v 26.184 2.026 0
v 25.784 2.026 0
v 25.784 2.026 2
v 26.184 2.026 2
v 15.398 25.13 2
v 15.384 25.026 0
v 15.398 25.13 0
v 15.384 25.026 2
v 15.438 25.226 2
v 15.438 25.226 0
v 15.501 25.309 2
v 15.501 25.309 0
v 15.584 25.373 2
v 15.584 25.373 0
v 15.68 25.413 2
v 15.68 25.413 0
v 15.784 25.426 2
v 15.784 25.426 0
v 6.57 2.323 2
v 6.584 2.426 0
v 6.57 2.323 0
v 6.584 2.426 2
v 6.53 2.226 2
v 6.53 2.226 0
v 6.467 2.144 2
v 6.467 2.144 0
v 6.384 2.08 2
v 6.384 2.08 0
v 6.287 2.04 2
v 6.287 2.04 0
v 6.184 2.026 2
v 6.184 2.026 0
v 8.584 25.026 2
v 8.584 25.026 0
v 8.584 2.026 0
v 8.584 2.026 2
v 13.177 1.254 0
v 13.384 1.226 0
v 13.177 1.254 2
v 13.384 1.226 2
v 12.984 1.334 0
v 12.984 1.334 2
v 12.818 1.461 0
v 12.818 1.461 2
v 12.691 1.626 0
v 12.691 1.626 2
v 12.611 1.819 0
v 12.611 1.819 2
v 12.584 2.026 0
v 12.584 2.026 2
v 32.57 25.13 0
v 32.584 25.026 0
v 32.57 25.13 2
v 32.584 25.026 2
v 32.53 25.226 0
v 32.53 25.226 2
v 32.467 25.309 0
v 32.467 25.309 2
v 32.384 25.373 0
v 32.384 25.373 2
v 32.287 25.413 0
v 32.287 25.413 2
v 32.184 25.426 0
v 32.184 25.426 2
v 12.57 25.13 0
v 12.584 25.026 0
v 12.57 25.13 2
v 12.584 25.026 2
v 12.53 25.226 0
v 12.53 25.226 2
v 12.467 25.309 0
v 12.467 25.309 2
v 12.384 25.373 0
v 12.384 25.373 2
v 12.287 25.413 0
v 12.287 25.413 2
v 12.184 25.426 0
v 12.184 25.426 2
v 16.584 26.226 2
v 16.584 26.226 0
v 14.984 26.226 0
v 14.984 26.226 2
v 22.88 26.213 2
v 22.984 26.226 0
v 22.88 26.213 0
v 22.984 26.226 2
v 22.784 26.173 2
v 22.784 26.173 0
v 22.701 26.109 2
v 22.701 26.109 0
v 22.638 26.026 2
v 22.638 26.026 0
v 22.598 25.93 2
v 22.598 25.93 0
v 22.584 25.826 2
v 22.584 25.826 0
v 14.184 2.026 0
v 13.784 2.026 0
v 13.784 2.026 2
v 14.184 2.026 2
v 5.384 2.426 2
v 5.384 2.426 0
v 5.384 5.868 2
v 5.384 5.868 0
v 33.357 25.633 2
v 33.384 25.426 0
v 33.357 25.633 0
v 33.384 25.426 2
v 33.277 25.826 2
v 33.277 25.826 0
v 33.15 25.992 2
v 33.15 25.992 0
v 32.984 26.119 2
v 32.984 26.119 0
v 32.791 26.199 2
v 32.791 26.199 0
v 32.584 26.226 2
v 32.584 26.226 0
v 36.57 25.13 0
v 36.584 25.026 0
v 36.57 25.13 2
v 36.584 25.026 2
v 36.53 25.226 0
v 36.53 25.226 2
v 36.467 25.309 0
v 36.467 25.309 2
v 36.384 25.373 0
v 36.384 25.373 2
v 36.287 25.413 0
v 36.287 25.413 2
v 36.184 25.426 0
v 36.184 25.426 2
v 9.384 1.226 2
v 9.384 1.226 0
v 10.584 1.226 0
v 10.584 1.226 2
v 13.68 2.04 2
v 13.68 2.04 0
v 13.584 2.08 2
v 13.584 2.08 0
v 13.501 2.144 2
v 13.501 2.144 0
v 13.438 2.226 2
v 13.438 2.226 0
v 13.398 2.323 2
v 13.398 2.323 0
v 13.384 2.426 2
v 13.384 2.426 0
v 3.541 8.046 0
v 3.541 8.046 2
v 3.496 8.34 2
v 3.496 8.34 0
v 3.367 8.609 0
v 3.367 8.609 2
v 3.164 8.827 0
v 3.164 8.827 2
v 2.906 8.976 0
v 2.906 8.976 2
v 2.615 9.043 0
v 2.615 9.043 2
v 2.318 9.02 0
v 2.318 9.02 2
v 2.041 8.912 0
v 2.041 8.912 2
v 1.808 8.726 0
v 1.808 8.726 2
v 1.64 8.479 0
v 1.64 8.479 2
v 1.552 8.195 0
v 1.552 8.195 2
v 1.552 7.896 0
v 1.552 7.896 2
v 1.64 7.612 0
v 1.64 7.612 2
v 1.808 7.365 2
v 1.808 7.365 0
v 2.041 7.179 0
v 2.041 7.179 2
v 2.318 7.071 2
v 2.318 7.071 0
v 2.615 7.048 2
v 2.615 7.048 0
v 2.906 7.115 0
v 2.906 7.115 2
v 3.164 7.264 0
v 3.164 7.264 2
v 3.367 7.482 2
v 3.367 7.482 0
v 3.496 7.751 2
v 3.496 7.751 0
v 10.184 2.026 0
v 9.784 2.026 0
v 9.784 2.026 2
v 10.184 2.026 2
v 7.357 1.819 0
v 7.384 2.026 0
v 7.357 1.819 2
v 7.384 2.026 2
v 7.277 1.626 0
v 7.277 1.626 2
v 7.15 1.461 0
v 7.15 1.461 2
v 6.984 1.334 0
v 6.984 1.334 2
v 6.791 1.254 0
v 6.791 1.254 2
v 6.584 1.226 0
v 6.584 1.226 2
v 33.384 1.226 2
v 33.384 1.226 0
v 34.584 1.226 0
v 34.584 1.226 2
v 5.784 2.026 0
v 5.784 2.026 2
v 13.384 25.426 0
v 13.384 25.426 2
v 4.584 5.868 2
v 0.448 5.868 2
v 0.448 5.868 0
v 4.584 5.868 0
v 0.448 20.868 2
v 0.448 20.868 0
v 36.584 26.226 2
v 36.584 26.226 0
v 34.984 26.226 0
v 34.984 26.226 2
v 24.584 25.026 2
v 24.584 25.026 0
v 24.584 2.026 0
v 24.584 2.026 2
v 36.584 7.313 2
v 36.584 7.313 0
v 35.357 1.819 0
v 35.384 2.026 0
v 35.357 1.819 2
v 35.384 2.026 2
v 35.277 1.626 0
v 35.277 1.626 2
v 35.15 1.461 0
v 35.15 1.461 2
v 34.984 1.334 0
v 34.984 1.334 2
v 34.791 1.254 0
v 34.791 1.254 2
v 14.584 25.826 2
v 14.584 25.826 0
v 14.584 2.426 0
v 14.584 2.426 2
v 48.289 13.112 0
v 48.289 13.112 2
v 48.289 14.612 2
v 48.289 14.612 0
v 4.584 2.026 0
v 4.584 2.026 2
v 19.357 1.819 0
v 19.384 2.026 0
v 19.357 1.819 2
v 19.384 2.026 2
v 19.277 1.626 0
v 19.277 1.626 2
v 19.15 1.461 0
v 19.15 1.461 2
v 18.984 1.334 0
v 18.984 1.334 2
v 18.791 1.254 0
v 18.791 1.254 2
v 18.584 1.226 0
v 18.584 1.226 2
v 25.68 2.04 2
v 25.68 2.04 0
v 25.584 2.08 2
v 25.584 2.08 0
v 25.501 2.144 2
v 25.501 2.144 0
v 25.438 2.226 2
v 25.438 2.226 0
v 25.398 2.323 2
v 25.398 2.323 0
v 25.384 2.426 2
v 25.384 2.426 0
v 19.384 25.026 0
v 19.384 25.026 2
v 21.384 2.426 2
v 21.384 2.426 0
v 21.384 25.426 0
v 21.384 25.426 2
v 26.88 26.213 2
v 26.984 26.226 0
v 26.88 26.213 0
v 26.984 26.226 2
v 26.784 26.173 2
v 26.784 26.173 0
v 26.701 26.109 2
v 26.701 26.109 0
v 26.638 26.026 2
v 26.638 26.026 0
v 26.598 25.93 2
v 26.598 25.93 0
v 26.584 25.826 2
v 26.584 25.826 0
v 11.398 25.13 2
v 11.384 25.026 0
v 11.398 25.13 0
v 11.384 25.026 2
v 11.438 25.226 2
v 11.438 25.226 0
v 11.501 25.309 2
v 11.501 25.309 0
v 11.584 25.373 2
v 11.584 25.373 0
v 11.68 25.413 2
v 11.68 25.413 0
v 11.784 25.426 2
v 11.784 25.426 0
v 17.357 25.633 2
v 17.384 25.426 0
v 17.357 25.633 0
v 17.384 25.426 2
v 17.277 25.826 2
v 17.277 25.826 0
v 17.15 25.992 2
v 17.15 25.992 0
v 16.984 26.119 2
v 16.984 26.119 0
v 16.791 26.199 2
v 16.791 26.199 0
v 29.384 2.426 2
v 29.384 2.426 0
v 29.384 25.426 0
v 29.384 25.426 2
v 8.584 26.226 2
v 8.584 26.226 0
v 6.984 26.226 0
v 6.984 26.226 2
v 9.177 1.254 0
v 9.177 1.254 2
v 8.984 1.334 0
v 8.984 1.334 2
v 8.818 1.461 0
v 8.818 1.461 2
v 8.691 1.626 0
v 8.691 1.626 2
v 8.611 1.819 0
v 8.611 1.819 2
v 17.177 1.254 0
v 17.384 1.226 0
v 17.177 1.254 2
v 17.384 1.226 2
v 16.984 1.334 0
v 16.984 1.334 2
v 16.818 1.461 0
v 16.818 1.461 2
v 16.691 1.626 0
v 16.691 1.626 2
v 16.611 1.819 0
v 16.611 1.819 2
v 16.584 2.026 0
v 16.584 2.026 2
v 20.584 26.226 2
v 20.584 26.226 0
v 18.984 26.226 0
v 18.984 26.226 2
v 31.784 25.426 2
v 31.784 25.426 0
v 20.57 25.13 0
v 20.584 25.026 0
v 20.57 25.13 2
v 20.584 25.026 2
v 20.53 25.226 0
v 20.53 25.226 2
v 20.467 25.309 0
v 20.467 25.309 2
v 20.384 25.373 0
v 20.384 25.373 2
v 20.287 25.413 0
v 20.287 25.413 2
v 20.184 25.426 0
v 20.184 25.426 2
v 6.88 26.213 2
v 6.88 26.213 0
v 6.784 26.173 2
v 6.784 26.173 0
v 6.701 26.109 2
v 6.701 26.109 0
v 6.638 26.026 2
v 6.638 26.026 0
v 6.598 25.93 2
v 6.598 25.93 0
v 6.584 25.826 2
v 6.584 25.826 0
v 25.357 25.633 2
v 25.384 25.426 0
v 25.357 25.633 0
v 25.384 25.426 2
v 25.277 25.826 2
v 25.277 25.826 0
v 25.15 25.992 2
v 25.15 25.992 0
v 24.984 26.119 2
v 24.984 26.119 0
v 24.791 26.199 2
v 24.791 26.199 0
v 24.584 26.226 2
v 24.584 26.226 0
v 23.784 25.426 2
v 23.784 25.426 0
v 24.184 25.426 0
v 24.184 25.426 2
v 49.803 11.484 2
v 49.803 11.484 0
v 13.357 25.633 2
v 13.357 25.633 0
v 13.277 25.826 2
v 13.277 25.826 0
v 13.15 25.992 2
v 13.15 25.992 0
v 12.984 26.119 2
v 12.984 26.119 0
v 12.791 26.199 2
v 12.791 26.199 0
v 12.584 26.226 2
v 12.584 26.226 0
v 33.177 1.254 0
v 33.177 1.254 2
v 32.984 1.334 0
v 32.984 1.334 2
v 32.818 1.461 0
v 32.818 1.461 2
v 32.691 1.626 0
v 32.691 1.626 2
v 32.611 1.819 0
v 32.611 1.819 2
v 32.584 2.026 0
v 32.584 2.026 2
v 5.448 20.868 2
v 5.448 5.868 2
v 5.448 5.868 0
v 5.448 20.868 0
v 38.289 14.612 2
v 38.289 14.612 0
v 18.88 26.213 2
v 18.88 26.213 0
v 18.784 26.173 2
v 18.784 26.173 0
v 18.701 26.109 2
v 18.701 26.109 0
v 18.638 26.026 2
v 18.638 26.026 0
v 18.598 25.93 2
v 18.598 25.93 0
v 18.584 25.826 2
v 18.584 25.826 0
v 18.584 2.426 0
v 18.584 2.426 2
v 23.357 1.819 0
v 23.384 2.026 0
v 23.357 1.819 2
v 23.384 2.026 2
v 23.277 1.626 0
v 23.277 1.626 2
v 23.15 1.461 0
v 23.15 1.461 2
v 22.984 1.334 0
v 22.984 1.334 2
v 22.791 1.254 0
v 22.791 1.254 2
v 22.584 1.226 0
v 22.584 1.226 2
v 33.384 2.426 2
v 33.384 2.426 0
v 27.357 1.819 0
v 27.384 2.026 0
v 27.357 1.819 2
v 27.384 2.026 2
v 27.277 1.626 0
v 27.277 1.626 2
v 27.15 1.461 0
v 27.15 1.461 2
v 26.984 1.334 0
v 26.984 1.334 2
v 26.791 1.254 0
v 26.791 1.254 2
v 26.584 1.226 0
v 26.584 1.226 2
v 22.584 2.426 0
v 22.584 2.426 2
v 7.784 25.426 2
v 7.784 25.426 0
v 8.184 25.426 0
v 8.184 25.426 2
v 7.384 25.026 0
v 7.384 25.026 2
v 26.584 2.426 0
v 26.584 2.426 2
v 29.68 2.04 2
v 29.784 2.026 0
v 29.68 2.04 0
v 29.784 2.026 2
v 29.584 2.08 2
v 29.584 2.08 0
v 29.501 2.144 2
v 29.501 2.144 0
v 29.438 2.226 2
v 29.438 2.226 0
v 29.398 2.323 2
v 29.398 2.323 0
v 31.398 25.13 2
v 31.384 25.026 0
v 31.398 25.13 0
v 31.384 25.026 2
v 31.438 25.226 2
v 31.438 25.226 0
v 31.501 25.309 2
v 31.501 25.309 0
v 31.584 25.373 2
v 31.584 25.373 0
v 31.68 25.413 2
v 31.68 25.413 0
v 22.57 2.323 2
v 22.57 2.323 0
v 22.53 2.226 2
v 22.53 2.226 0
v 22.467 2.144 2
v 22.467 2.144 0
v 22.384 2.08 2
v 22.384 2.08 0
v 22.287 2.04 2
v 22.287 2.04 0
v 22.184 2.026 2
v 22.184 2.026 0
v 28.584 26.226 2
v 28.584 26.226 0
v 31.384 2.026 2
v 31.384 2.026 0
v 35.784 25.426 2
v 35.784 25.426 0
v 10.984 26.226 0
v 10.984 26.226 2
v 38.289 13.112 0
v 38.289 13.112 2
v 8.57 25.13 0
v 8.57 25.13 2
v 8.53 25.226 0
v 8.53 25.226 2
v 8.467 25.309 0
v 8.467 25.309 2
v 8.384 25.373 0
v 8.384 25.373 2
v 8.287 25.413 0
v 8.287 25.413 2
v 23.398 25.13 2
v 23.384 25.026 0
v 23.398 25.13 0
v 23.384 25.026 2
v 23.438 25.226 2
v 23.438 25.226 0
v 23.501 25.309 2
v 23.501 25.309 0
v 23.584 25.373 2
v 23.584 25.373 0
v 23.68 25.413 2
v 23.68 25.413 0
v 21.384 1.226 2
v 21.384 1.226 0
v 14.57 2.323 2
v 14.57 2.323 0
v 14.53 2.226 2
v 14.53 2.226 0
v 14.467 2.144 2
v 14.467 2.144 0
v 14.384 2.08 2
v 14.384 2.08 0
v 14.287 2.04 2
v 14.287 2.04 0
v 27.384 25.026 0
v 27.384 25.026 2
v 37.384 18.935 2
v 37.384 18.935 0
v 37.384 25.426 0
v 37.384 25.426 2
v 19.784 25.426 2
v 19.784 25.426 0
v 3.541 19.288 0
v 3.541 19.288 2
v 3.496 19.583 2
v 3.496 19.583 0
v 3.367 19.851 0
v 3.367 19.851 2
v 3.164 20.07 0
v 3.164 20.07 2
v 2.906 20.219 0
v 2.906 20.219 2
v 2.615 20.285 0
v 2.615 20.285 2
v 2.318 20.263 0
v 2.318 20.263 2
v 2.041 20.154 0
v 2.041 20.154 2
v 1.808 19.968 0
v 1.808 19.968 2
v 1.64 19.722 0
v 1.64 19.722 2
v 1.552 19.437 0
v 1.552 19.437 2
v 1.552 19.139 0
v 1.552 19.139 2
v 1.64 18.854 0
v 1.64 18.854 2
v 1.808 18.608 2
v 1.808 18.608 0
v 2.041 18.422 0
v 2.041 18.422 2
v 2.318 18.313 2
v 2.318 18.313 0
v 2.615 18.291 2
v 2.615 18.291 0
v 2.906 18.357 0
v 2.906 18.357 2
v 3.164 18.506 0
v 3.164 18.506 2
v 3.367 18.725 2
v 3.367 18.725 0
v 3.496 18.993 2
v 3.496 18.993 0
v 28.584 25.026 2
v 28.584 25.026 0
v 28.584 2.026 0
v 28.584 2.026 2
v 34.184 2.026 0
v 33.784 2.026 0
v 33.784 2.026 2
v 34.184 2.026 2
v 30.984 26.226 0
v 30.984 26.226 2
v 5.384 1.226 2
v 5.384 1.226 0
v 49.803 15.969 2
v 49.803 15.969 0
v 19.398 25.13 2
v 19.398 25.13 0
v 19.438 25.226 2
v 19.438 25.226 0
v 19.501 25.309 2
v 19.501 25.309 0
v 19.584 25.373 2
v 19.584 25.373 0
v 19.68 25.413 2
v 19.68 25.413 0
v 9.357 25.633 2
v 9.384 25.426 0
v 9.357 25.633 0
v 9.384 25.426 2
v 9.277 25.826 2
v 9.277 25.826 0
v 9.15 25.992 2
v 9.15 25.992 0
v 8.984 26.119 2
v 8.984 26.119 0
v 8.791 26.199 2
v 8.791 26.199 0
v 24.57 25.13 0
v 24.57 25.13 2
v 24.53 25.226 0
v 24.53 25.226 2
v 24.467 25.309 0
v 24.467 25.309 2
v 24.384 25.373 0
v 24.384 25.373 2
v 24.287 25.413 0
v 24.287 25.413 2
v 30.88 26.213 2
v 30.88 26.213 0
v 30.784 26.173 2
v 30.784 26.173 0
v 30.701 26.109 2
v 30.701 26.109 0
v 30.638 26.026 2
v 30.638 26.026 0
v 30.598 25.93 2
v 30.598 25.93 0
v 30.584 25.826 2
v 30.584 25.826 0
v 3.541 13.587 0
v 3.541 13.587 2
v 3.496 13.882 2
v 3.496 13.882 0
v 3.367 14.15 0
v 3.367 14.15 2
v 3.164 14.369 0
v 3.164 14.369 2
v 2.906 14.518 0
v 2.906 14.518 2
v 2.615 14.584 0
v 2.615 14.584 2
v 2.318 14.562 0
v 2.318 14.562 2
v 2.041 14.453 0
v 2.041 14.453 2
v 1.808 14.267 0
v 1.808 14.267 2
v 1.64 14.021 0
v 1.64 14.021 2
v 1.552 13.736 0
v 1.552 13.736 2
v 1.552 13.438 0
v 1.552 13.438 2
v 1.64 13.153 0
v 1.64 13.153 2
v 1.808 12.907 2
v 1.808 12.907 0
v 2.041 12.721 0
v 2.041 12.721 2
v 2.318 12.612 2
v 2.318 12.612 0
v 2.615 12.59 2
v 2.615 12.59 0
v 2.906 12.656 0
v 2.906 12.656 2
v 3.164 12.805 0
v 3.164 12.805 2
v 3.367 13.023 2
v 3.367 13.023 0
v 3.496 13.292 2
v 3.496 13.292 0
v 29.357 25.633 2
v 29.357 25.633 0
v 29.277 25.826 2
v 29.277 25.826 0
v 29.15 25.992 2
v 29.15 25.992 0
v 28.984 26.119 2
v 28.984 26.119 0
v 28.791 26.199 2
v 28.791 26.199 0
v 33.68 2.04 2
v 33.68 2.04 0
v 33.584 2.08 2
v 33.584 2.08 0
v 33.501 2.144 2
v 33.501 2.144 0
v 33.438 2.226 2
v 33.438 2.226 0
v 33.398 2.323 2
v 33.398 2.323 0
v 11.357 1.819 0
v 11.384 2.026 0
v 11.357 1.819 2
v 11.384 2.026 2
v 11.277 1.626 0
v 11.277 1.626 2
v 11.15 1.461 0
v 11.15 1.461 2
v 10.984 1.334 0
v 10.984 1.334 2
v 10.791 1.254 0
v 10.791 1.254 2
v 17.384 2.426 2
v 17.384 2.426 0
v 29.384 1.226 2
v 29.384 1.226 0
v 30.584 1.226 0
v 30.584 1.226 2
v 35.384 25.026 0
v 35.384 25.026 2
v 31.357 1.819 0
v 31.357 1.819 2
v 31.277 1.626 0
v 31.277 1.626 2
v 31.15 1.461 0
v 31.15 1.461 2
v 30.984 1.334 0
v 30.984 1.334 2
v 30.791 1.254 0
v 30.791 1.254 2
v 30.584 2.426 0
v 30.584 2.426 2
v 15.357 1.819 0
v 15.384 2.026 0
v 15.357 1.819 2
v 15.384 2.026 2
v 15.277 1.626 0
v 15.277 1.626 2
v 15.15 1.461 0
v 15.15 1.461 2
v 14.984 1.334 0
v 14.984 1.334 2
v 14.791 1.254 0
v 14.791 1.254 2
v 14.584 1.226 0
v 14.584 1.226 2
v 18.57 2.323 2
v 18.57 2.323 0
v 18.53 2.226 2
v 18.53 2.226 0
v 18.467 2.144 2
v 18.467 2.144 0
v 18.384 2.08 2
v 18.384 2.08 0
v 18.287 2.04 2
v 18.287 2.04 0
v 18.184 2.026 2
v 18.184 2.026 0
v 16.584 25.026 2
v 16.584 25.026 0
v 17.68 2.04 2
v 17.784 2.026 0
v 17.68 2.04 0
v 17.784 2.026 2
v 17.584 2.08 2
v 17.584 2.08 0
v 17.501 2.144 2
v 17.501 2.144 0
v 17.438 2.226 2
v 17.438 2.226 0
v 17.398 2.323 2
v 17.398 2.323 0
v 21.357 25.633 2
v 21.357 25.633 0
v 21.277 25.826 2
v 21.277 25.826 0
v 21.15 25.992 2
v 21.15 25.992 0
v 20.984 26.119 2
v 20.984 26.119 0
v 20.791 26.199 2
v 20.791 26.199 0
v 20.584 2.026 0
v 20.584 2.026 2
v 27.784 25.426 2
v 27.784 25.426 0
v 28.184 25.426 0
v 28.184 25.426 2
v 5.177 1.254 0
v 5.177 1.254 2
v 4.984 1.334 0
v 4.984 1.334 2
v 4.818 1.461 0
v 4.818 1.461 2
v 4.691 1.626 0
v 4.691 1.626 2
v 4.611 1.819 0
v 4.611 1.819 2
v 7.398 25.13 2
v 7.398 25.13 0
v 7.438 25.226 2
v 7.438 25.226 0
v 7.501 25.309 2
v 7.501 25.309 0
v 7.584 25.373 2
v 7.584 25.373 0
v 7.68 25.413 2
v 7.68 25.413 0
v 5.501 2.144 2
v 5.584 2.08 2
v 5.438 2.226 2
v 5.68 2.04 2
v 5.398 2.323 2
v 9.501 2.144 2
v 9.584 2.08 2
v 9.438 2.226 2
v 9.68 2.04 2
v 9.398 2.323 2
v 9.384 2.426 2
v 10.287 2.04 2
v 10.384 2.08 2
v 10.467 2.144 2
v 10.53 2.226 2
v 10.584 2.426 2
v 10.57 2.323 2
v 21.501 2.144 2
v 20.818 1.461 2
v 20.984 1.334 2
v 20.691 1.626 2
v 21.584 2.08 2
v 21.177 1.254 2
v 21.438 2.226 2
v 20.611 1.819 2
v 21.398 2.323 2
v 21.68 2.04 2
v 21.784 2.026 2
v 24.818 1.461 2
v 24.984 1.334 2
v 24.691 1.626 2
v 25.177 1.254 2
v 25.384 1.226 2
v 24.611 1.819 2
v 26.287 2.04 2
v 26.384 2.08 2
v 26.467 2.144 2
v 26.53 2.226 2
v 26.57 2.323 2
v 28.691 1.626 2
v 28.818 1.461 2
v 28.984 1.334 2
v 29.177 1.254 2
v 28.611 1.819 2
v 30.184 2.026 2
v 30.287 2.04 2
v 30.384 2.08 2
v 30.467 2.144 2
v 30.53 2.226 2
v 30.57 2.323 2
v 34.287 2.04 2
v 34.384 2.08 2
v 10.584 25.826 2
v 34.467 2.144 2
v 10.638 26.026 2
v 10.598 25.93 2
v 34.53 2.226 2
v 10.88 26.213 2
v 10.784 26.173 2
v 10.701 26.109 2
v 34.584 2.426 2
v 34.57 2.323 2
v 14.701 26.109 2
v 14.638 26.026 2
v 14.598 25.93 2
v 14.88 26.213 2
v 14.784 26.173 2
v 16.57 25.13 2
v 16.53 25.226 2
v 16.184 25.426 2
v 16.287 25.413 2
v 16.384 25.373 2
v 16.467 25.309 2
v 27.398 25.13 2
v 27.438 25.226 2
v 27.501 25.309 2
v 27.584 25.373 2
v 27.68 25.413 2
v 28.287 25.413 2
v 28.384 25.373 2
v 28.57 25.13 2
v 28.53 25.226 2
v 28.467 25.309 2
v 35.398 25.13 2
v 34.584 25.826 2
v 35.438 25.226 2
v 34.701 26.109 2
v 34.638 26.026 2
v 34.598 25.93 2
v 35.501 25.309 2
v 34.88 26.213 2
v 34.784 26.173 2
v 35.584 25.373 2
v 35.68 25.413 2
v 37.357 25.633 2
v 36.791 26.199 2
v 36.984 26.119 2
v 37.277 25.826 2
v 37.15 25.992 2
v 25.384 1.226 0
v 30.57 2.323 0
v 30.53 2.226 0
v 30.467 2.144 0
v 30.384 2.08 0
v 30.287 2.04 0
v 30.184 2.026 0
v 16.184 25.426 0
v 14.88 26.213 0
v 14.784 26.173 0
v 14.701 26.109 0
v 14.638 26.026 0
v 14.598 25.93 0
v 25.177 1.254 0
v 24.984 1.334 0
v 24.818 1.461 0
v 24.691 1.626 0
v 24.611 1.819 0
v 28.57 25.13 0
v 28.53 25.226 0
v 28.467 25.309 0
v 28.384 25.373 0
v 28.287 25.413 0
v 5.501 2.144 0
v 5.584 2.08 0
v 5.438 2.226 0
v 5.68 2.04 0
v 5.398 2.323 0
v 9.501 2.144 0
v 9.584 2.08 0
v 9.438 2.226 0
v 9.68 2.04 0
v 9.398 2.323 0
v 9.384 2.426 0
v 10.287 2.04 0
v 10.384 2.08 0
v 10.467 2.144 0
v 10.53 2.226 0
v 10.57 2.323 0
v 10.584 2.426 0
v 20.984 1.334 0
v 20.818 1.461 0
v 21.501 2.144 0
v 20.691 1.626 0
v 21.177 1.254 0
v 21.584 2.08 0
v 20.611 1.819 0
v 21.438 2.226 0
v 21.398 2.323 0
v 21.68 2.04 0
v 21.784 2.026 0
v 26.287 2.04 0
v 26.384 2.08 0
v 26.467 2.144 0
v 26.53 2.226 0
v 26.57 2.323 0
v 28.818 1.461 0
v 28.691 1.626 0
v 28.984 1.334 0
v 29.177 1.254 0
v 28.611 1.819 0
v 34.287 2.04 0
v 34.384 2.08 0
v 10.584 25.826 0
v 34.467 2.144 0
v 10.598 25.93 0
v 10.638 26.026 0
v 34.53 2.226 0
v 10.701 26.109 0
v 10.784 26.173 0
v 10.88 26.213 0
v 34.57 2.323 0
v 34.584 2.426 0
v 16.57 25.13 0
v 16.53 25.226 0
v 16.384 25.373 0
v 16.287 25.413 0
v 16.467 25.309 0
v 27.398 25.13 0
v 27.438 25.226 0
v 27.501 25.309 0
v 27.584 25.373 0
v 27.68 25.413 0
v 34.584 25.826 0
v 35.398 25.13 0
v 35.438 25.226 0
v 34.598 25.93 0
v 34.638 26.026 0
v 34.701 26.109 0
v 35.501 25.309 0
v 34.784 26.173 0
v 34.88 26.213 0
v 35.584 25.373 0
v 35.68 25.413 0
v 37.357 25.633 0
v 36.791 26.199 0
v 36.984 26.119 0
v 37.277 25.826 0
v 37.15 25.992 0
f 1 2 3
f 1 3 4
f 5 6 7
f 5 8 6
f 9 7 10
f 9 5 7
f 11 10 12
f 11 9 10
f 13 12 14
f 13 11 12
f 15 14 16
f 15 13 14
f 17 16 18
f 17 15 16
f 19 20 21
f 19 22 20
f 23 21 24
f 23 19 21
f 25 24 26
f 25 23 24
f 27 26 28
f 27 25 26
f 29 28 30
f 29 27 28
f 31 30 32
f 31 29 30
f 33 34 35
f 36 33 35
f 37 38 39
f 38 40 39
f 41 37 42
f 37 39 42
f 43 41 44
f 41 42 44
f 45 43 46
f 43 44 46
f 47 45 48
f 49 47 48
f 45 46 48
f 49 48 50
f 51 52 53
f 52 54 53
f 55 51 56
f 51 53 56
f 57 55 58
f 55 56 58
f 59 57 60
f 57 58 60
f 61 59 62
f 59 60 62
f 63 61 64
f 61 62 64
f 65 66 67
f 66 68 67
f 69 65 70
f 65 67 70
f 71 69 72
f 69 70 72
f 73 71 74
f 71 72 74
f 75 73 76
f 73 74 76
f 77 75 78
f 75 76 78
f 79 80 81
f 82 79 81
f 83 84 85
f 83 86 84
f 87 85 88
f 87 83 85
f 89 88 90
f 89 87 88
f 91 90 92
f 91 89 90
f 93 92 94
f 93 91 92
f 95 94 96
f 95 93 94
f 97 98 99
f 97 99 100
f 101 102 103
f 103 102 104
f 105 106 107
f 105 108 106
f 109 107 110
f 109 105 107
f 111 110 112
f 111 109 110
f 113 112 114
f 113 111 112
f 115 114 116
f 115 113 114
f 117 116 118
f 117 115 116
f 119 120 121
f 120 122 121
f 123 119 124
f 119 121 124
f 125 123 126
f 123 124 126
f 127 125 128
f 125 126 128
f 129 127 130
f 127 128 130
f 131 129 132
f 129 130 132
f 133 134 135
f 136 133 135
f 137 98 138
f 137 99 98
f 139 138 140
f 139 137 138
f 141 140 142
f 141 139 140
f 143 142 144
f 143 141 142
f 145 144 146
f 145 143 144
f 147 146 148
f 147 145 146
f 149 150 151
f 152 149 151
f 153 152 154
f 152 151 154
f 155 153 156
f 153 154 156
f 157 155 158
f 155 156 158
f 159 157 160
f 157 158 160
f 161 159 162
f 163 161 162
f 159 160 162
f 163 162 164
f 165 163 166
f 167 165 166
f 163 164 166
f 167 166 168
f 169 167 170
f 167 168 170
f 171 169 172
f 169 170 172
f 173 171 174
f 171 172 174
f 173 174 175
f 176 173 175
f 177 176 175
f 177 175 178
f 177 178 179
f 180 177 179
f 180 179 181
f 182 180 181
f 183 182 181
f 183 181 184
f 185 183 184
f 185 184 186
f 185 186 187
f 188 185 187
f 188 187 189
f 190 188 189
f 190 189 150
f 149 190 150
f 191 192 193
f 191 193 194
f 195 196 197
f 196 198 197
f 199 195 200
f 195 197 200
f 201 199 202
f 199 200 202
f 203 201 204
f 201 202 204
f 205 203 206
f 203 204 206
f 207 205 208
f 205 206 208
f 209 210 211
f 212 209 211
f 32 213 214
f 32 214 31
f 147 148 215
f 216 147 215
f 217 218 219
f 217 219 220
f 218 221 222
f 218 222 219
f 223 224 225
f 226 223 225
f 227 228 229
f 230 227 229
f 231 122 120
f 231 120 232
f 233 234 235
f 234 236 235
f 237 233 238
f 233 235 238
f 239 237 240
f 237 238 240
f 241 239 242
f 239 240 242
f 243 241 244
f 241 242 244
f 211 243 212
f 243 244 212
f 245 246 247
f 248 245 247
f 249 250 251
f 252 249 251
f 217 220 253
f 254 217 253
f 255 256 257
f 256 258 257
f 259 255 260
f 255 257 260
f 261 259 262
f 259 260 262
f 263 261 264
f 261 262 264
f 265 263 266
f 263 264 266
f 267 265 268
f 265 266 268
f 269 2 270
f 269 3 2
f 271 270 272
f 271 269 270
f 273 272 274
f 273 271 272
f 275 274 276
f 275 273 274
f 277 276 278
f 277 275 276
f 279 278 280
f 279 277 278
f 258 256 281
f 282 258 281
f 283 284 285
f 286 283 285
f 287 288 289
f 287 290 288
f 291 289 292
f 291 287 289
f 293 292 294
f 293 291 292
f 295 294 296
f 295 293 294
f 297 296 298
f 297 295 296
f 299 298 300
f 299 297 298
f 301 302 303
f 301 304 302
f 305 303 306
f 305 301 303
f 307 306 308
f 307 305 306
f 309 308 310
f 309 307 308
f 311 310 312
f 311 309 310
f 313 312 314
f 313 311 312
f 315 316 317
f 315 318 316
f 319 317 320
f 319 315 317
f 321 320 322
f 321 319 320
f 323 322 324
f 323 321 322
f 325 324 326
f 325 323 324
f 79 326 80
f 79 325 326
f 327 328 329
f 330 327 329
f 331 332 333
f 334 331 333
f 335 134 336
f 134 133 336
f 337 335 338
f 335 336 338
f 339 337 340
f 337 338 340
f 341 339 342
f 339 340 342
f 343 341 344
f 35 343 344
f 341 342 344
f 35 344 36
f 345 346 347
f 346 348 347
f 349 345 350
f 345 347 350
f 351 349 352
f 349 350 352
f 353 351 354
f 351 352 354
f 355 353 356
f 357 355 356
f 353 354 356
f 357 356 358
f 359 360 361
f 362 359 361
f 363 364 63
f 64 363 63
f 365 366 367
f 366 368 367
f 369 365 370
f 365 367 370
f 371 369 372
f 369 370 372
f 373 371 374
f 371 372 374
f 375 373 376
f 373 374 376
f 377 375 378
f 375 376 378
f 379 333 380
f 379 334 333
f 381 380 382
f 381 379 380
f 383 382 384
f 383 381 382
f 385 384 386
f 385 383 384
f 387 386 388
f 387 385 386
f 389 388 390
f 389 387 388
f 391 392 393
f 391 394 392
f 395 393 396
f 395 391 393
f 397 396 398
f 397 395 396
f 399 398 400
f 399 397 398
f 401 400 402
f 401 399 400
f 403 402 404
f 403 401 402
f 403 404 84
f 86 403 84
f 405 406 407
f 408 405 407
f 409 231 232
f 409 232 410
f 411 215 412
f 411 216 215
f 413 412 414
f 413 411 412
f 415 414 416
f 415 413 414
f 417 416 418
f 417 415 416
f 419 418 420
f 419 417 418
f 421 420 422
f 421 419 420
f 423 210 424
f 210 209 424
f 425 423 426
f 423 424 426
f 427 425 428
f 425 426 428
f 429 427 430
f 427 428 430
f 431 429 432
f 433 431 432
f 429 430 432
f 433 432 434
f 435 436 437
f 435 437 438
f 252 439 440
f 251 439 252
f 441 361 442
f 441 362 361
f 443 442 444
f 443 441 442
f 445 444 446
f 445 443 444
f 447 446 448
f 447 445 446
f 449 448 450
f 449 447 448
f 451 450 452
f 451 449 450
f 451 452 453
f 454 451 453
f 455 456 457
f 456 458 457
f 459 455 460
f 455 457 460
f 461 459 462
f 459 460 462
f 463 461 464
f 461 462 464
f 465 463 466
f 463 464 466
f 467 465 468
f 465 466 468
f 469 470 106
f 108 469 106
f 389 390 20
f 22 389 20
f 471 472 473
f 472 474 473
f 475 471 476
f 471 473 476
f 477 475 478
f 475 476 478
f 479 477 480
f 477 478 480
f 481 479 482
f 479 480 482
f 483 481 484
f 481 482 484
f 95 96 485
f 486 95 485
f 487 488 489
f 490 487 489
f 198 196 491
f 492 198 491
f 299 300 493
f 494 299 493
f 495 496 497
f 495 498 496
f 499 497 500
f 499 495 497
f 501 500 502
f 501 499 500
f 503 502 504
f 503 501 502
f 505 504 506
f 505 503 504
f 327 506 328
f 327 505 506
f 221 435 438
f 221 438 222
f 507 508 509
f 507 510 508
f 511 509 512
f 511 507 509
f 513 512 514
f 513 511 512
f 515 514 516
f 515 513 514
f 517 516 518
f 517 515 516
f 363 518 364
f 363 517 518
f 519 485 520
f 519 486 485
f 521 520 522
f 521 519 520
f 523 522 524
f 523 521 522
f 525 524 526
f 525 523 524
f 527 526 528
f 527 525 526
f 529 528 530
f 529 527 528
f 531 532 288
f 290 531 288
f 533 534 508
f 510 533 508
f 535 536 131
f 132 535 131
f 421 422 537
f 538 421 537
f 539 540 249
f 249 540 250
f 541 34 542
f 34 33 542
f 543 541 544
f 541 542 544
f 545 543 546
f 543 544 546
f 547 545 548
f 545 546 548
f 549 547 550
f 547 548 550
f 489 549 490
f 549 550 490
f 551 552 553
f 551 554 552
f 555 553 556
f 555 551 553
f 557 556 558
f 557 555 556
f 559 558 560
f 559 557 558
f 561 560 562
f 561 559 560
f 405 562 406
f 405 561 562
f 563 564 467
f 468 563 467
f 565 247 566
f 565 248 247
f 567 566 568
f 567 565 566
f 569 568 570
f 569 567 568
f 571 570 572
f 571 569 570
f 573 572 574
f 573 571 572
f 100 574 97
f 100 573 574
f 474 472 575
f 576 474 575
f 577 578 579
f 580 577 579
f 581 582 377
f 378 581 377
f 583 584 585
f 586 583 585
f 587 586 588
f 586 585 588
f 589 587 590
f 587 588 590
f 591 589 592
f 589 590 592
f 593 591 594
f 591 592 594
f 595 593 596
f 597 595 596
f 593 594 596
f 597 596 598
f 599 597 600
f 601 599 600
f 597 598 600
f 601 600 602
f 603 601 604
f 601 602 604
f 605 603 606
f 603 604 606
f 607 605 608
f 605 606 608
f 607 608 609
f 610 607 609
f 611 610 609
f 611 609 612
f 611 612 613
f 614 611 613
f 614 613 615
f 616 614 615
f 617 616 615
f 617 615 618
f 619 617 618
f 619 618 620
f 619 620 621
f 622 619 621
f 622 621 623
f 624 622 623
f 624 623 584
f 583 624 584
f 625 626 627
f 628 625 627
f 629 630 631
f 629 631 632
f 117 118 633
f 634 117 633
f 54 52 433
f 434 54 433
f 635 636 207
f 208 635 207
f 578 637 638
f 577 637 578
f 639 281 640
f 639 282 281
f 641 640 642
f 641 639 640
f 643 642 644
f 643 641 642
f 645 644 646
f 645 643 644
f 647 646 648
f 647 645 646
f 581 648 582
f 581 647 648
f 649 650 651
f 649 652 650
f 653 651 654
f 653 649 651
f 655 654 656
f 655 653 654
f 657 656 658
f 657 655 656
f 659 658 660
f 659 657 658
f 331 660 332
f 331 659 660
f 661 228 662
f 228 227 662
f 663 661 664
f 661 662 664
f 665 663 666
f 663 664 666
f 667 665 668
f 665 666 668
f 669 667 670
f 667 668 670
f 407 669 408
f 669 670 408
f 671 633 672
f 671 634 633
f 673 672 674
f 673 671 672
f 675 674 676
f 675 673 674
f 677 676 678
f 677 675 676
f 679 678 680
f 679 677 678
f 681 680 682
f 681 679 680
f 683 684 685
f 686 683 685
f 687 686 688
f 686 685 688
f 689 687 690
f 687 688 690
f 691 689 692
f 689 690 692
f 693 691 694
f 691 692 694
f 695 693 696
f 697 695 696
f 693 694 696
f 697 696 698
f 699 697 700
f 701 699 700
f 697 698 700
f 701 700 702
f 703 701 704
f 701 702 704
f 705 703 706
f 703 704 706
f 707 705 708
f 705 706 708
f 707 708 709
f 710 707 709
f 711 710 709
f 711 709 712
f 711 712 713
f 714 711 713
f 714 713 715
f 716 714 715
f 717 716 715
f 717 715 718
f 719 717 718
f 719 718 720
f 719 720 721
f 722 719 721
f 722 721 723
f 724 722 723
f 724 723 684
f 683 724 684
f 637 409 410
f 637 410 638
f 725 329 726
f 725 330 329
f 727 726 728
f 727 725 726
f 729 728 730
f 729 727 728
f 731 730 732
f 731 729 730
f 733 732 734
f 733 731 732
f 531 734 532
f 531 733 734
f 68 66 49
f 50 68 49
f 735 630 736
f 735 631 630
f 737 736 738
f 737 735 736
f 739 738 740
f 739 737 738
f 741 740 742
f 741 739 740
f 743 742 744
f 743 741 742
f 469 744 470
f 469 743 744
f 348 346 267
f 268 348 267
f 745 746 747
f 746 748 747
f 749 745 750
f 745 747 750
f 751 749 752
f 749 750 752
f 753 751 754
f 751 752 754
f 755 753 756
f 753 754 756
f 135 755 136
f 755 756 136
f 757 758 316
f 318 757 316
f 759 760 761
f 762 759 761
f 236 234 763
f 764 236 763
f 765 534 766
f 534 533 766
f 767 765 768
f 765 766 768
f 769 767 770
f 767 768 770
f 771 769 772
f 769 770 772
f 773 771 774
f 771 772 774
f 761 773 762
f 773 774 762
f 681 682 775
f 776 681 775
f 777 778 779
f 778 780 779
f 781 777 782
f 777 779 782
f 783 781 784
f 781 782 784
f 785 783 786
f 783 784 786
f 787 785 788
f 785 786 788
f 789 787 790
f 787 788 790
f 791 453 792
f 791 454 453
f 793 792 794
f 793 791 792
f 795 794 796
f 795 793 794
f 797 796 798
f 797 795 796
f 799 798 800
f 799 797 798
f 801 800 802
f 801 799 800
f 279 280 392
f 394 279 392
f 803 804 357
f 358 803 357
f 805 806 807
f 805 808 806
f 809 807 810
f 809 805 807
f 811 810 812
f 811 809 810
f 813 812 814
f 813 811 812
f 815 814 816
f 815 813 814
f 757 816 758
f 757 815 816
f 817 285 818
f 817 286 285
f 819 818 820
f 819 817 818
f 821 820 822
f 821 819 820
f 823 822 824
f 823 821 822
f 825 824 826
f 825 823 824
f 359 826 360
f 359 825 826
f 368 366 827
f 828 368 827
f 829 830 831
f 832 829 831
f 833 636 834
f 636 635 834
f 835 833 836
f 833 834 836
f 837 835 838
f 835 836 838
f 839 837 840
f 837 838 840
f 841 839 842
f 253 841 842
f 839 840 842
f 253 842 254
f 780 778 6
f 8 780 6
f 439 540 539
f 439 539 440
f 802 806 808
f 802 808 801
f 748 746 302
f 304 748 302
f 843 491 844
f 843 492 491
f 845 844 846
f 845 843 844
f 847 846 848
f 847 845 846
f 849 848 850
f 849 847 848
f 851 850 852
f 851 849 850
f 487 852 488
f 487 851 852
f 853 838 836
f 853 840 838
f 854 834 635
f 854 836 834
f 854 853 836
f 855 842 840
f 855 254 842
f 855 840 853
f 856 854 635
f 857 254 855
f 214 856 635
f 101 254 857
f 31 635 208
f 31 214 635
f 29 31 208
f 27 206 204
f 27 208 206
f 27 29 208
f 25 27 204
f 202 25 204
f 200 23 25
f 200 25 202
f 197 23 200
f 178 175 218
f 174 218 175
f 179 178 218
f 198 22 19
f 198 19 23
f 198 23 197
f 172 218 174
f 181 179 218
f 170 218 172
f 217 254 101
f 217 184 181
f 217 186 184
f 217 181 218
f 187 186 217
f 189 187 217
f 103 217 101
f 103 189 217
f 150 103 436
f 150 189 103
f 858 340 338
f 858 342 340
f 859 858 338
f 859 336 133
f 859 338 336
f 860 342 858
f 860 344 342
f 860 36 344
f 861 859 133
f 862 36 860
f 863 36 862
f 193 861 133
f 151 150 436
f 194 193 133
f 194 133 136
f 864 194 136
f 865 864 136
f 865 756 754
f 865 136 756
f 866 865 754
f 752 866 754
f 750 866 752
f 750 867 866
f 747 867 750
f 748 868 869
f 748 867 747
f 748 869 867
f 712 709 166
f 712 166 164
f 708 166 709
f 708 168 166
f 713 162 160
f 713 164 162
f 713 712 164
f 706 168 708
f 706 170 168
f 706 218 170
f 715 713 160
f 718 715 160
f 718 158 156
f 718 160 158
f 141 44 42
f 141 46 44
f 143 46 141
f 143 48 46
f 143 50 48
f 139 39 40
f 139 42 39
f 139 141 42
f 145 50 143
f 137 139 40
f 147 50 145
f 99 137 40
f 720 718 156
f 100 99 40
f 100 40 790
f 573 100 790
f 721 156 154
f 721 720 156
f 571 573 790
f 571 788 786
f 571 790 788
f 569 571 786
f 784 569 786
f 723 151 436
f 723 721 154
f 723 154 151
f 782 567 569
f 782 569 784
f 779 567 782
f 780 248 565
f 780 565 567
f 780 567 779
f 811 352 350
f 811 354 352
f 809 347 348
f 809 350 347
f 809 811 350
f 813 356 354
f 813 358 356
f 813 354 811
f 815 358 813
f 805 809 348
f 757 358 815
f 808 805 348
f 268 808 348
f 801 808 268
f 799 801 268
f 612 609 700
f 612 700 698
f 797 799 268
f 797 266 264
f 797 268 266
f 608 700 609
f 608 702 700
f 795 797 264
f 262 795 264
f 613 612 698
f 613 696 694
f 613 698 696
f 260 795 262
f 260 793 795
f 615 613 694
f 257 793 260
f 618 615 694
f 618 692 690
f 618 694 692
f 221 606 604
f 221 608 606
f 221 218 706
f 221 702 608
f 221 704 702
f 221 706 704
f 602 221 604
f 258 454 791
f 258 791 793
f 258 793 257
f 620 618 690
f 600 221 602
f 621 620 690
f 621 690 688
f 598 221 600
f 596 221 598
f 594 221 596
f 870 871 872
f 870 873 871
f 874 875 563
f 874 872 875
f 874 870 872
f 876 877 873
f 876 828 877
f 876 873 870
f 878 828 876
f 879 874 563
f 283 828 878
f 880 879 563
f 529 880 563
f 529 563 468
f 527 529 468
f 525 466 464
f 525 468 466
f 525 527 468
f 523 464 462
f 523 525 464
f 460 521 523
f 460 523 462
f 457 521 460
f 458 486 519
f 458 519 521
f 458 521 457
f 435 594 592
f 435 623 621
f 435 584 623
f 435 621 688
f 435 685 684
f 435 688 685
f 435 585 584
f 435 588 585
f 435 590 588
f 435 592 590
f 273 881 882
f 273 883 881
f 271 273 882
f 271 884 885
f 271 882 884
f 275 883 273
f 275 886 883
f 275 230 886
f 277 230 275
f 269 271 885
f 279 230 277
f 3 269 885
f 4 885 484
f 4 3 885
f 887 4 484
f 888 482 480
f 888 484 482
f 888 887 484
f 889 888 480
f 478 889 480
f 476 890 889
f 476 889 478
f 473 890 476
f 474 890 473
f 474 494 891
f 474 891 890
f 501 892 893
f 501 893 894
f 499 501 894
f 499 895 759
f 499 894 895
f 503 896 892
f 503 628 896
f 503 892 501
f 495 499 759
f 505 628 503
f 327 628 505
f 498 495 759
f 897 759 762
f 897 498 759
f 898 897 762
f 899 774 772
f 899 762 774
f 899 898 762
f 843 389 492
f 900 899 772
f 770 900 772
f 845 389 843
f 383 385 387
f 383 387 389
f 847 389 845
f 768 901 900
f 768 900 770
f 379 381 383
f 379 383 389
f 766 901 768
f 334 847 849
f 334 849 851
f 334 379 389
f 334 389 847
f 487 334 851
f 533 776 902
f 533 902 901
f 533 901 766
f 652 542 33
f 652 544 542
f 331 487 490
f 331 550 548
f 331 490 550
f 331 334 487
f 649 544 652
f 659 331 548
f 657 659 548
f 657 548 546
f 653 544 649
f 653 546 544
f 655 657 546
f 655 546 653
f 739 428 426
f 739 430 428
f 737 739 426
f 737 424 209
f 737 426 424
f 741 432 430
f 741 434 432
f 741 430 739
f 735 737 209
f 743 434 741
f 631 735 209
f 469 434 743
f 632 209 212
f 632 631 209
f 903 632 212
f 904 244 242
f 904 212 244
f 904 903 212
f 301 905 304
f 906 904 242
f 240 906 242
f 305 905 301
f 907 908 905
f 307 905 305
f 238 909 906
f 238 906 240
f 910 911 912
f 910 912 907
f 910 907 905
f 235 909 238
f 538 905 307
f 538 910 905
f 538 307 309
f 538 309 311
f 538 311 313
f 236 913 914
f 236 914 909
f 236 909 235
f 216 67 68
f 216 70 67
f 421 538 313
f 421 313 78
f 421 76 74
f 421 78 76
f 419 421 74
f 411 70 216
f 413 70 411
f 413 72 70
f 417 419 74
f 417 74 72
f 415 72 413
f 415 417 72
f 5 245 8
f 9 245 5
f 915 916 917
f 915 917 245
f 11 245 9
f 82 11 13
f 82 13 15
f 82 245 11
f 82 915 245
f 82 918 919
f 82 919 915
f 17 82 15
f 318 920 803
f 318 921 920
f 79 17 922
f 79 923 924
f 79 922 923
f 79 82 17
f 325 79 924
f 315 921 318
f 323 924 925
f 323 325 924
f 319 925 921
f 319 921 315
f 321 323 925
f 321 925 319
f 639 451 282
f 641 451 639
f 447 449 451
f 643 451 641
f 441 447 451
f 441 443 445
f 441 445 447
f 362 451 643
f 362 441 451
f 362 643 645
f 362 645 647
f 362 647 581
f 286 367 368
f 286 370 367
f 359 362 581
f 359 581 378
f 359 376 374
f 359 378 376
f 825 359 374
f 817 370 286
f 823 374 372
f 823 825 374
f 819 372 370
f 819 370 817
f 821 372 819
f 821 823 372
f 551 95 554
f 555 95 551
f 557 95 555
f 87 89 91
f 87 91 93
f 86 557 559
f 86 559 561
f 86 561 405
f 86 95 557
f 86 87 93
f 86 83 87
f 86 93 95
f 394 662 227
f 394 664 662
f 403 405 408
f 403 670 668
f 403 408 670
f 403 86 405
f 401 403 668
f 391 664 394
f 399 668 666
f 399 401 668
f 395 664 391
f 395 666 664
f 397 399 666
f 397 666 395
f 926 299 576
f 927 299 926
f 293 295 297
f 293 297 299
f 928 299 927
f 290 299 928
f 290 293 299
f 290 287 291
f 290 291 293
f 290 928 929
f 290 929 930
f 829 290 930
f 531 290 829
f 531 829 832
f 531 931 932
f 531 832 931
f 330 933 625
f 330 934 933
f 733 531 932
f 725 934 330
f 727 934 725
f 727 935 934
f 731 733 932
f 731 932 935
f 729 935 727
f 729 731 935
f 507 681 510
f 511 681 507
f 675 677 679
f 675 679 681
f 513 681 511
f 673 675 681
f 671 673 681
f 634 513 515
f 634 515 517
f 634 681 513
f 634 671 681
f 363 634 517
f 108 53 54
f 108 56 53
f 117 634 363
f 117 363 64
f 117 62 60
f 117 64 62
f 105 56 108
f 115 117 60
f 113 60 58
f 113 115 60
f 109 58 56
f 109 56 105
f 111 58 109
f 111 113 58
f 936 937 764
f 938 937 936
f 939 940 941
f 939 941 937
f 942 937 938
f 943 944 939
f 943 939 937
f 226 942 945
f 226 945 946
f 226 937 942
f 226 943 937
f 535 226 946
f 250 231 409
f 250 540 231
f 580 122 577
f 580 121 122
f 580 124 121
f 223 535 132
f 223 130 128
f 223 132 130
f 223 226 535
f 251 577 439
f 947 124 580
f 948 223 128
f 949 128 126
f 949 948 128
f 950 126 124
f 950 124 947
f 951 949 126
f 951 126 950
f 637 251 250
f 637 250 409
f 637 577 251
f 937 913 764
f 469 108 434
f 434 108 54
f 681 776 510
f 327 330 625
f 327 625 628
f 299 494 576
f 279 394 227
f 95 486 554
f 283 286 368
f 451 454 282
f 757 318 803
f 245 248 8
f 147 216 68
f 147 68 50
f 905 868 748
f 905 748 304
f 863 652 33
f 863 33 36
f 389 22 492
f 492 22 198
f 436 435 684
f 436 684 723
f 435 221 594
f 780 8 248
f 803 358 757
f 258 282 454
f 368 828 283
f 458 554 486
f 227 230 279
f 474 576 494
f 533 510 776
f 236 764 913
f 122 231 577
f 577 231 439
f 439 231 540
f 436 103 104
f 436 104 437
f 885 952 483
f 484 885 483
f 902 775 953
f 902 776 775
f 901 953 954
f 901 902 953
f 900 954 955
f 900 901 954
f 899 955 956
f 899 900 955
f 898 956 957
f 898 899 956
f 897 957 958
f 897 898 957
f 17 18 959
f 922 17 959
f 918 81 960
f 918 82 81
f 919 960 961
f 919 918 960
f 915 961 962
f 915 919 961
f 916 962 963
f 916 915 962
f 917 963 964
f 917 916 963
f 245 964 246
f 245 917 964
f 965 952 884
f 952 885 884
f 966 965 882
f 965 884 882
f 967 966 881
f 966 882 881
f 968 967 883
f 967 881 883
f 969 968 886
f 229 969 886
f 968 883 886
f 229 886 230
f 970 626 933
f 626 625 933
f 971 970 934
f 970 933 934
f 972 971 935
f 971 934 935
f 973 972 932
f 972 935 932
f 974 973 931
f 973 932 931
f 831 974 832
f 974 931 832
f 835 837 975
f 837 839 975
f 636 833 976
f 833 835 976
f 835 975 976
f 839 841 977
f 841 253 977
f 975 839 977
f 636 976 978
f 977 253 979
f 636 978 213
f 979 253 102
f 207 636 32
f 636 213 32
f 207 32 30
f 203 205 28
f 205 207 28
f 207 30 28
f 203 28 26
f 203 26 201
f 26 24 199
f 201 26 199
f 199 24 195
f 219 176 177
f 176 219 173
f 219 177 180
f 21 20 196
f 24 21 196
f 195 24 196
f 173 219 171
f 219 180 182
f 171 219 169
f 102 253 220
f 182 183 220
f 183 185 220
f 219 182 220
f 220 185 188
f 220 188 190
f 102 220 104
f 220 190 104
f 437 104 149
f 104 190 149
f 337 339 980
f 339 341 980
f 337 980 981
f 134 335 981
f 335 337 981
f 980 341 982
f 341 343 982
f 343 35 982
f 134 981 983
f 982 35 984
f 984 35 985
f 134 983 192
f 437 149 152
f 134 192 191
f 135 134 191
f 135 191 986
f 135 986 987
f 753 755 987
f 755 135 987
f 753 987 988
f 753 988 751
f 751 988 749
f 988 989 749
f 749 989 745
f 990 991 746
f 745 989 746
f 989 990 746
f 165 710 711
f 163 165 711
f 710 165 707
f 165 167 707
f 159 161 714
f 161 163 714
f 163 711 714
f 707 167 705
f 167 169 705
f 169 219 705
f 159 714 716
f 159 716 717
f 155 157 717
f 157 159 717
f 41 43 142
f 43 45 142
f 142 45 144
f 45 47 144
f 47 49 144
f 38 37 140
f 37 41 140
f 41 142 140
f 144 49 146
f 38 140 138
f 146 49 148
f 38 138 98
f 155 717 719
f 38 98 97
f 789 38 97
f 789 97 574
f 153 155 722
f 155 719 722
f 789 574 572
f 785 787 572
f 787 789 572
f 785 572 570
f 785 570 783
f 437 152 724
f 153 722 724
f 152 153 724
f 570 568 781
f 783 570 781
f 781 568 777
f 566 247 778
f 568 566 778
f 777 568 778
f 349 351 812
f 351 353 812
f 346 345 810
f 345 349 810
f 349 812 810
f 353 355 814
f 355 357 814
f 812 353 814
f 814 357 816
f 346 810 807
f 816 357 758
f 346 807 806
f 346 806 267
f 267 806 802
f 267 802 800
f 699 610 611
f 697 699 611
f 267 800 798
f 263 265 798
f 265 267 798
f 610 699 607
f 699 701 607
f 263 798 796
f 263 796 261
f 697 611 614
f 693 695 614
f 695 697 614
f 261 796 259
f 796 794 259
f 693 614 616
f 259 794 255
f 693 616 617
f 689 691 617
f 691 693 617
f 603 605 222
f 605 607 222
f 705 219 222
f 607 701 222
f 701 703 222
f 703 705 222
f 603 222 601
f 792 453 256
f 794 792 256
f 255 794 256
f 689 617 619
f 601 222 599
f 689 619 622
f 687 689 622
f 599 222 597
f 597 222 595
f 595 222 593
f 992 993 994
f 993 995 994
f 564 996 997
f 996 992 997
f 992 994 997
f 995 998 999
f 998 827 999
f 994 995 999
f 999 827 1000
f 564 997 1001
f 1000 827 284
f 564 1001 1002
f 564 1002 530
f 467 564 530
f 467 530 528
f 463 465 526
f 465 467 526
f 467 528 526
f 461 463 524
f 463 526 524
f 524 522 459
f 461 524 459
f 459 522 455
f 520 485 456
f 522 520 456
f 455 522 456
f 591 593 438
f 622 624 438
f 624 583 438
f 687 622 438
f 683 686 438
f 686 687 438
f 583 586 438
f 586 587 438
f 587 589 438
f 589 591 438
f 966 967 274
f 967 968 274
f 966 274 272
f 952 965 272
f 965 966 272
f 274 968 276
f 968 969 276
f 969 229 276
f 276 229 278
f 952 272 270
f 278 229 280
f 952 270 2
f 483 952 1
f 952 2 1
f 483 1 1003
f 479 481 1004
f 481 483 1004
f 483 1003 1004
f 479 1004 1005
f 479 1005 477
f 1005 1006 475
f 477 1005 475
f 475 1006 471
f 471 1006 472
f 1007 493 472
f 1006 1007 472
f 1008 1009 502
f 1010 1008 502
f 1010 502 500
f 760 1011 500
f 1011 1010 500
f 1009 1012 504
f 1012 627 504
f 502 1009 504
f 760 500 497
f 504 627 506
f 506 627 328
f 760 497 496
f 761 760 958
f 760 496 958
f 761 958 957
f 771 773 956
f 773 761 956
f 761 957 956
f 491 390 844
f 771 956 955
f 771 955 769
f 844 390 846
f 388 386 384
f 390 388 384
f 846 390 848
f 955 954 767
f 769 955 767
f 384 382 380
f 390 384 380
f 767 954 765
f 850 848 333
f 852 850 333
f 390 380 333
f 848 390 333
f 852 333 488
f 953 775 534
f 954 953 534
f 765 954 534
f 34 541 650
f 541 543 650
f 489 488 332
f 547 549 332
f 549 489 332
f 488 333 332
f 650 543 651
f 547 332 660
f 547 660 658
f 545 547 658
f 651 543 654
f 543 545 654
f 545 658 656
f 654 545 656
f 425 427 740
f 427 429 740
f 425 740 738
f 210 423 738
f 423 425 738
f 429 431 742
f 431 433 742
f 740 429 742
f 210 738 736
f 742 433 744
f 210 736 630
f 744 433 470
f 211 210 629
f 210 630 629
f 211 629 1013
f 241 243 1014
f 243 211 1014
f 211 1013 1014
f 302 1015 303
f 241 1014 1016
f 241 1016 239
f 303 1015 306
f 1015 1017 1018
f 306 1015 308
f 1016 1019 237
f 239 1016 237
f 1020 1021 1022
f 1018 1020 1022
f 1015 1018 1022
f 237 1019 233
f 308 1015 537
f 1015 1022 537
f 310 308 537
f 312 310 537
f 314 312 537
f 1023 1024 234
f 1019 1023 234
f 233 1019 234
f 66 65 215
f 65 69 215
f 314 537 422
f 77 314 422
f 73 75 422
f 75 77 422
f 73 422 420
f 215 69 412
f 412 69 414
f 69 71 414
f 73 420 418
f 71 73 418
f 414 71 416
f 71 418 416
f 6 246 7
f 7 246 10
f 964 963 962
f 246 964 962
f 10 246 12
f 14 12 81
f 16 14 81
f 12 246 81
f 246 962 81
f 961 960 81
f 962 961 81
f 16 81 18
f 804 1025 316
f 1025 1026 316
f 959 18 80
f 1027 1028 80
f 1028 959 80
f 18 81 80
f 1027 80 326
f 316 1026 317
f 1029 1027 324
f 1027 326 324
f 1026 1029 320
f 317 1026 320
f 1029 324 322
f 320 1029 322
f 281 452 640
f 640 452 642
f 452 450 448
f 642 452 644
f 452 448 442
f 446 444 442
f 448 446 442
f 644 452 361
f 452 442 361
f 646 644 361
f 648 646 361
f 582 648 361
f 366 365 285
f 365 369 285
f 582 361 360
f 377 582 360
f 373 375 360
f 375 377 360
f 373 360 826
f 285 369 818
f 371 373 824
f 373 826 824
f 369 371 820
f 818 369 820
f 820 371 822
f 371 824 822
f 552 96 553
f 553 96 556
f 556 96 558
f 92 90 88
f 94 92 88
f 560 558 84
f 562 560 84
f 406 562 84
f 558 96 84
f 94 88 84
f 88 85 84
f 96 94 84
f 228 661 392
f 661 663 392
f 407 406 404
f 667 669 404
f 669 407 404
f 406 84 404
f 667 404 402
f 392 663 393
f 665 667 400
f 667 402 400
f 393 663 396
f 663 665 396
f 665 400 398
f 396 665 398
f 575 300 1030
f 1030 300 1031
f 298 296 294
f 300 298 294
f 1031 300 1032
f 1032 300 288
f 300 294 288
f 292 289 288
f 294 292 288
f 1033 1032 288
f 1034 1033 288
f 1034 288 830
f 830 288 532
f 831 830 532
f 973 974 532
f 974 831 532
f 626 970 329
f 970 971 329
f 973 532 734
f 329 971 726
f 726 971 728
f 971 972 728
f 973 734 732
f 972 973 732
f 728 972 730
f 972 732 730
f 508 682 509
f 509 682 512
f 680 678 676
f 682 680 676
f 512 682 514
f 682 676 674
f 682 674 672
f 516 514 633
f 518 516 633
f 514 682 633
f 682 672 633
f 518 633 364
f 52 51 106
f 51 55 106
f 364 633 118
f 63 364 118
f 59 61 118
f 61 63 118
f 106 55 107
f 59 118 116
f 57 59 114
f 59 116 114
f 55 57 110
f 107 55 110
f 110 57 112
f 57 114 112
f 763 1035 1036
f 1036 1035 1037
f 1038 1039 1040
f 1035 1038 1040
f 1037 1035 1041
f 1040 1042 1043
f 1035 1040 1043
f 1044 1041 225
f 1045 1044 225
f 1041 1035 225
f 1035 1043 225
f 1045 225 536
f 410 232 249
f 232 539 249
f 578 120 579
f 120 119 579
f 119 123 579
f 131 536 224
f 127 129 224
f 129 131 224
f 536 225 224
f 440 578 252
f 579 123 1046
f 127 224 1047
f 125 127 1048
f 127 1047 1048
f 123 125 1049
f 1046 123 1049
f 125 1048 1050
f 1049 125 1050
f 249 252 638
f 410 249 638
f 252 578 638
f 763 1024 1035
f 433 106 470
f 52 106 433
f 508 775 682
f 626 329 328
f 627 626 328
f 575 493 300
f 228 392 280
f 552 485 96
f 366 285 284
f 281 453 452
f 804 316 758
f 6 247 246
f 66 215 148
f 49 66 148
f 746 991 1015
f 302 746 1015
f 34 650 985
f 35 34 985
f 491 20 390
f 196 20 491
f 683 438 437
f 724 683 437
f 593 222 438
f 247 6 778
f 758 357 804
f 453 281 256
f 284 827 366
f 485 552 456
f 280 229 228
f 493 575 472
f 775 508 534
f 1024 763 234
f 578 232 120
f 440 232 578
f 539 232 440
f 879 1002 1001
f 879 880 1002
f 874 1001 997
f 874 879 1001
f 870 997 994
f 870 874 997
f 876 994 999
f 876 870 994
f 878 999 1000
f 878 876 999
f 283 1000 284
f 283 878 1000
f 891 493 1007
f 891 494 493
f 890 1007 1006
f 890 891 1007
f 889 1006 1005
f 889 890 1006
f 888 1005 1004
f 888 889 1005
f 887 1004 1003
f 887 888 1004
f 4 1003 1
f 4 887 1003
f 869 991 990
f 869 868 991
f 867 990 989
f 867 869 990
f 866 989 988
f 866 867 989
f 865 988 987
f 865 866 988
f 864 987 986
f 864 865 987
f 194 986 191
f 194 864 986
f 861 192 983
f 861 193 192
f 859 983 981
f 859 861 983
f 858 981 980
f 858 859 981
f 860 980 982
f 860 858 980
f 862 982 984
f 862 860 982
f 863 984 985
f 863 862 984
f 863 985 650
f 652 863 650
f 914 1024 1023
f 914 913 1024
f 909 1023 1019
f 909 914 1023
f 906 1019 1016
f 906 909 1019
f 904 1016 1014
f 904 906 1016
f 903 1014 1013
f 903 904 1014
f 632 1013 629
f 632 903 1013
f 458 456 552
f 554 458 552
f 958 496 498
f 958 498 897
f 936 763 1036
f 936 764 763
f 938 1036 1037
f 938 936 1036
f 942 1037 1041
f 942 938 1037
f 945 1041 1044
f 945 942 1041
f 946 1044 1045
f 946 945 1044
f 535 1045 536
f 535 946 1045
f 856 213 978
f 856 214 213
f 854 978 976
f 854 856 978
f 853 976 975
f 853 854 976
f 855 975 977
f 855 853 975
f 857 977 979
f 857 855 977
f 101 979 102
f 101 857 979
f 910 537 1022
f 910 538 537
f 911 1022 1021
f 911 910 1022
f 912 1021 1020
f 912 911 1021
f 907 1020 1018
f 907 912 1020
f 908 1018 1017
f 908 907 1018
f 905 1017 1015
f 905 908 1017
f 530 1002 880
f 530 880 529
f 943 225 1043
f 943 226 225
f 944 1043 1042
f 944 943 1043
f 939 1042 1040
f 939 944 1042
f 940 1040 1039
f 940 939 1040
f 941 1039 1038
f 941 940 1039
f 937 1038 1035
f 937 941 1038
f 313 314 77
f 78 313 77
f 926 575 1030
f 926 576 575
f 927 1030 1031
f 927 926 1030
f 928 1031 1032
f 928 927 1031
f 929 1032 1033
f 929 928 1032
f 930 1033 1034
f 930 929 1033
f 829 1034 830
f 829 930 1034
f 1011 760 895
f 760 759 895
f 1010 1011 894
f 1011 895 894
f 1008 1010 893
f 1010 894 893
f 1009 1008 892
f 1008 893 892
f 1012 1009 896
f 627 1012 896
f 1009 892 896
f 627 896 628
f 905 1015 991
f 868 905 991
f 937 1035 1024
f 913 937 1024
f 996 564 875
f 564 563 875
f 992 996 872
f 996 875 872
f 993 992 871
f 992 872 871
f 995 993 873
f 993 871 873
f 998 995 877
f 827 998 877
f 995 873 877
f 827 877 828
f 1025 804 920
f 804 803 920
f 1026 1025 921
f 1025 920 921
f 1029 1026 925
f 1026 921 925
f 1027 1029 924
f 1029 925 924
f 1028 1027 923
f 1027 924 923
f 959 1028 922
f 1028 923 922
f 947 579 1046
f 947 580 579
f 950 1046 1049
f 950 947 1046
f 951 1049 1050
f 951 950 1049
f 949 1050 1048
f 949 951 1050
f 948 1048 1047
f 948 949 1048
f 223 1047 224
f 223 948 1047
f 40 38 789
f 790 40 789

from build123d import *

# Parameters (mm, degrees)
F0_W      = 1.2
F0_H      = 0.8
F1_DEPTH  = 2
F2_R      = 0.4
F3_R      = 0.8
F11_DEPTH = 2
F14_DEPTH = 2
F15_R     = 1
F16_DEPTH = 2.001
F17_W     = 10
F17_H     = 1.5
F18_DEPTH = 2.001


with BuildPart() as f1:
    # F0 (on Top) → F1 (new body)
    with BuildSketch(Plane.XY):
        Polygon((8.5839435473, 25.4264183629), (8.5839435473, 13.2264183629), (9.3839435473, 13.2264183629), (9.3839435473, 26.2264183629), (6.5839435473, 26.2264183629), (6.5839435473, 2.0264183629), (6.5839435473, 1.2264183629), (7.3839435473, 1.2264183629), (7.3839435473, 25.4264183629), align=None)
        Polygon((4.5839435473, 1.2264183629), (5.3839435473, 1.2264183629), (5.3839435473, 2.0264183629), (5.3839435473, 14.2264183629), (4.5839435473, 14.2264183629), align=None)
        with Locations((5.9839435473, 1.6264183629)):
            Rectangle(F0_W, F0_H)
    extrude(amount=F1_DEPTH)

    # F2
    f2_edges = [f1.edges().sort_by_distance(p)[0] for p in [
        (7.383944, 25.426418, 1),
        (8.583944, 25.426418, 1),
        (5.383944, 2.026418, 1),
        (6.583944, 2.026418, 1),
        (6.583944, 26.226418, 1),
    ]]
    fillet(f2_edges, radius=F2_R)

    # F3
    f3_edges = [f1.edges().sort_by_distance(p)[0] for p in [
        (9.383944, 26.226418, 1),
        (7.383944, 1.226418, 1),
        (4.583944, 1.226418, 1),
    ]]
    fillet(f3_edges, radius=F3_R)


with BuildPart() as f4_1:
    # F4: copy of F1
    add(f1.part.moved(Location((4, 0, 0))))


with BuildPart() as f1_1:
    add(f1.part)

    # F5: union F4_1
    add(f4_1.part)


with BuildPart() as f6_1:
    # F6: copy of F1
    add(f1_1.part.moved(Location((8, 0, 0))))


with BuildPart() as f1_2:
    add(f1_1.part)

    # F7: union F6_1
    add(f6_1.part)


with BuildPart() as f8_1:
    # F8: copy of F1
    add(f1_2.part.moved(Location((16, 0, 0))))


with BuildPart() as f1_3:
    add(f1_2.part)

    # F9: union F8_1
    add(f8_1.part)

    # F10 (on face) → F11 (join)
    with BuildSketch(Plane.XY.offset(2)):
        Polygon((5.4478760238, 5.8683240786), (5.4478760238, 20.8683240786), (0.4478760238, 20.8683240786), (0.4478760238, 5.8683240786), (4.5839435473, 5.8683240786), (4.5839435473, 14.2264183629), (5.3839435473, 14.2264183629), (5.3839435473, 5.8683240786), align=None)
    extrude(amount=-F11_DEPTH)

    # F12: union 

    # F13 (on face) → F14 (join)
    with BuildSketch(Plane.XY.offset(2)):
        Polygon((49.8028248549, 15.969062224), (37.3839435473, 18.9353367689), (37.3839435473, 13.2264183629), (36.5839435473, 13.2264183629), (36.5839435473, 7.3133227415), (49.8028248549, 11.4841348702), align=None)
    extrude(amount=-F14_DEPTH)

    # F15 (on face) → F16 (cut, through all)
    with BuildSketch(Plane.XY.offset(2)):
        with Locations((2.5405562483, 19.2878898233)):
            Circle(F15_R)
        with Locations((2.5405562483, 13.5867726058)):
            Circle(F15_R)
        with Locations((2.5405562483, 8.0455001444)):
            Circle(F15_R)
    extrude(amount=-F16_DEPTH, mode=Mode.SUBTRACT)

    # F17 (on face) → F18 (cut, through all)
    with BuildSketch(Plane.XY.offset(2)):
        with Locations((43.2889471948, 13.8618260324)):
            Rectangle(F17_W, F17_H)
    extrude(amount=-F18_DEPTH, mode=Mode.SUBTRACT)


solid = f1_3.part
